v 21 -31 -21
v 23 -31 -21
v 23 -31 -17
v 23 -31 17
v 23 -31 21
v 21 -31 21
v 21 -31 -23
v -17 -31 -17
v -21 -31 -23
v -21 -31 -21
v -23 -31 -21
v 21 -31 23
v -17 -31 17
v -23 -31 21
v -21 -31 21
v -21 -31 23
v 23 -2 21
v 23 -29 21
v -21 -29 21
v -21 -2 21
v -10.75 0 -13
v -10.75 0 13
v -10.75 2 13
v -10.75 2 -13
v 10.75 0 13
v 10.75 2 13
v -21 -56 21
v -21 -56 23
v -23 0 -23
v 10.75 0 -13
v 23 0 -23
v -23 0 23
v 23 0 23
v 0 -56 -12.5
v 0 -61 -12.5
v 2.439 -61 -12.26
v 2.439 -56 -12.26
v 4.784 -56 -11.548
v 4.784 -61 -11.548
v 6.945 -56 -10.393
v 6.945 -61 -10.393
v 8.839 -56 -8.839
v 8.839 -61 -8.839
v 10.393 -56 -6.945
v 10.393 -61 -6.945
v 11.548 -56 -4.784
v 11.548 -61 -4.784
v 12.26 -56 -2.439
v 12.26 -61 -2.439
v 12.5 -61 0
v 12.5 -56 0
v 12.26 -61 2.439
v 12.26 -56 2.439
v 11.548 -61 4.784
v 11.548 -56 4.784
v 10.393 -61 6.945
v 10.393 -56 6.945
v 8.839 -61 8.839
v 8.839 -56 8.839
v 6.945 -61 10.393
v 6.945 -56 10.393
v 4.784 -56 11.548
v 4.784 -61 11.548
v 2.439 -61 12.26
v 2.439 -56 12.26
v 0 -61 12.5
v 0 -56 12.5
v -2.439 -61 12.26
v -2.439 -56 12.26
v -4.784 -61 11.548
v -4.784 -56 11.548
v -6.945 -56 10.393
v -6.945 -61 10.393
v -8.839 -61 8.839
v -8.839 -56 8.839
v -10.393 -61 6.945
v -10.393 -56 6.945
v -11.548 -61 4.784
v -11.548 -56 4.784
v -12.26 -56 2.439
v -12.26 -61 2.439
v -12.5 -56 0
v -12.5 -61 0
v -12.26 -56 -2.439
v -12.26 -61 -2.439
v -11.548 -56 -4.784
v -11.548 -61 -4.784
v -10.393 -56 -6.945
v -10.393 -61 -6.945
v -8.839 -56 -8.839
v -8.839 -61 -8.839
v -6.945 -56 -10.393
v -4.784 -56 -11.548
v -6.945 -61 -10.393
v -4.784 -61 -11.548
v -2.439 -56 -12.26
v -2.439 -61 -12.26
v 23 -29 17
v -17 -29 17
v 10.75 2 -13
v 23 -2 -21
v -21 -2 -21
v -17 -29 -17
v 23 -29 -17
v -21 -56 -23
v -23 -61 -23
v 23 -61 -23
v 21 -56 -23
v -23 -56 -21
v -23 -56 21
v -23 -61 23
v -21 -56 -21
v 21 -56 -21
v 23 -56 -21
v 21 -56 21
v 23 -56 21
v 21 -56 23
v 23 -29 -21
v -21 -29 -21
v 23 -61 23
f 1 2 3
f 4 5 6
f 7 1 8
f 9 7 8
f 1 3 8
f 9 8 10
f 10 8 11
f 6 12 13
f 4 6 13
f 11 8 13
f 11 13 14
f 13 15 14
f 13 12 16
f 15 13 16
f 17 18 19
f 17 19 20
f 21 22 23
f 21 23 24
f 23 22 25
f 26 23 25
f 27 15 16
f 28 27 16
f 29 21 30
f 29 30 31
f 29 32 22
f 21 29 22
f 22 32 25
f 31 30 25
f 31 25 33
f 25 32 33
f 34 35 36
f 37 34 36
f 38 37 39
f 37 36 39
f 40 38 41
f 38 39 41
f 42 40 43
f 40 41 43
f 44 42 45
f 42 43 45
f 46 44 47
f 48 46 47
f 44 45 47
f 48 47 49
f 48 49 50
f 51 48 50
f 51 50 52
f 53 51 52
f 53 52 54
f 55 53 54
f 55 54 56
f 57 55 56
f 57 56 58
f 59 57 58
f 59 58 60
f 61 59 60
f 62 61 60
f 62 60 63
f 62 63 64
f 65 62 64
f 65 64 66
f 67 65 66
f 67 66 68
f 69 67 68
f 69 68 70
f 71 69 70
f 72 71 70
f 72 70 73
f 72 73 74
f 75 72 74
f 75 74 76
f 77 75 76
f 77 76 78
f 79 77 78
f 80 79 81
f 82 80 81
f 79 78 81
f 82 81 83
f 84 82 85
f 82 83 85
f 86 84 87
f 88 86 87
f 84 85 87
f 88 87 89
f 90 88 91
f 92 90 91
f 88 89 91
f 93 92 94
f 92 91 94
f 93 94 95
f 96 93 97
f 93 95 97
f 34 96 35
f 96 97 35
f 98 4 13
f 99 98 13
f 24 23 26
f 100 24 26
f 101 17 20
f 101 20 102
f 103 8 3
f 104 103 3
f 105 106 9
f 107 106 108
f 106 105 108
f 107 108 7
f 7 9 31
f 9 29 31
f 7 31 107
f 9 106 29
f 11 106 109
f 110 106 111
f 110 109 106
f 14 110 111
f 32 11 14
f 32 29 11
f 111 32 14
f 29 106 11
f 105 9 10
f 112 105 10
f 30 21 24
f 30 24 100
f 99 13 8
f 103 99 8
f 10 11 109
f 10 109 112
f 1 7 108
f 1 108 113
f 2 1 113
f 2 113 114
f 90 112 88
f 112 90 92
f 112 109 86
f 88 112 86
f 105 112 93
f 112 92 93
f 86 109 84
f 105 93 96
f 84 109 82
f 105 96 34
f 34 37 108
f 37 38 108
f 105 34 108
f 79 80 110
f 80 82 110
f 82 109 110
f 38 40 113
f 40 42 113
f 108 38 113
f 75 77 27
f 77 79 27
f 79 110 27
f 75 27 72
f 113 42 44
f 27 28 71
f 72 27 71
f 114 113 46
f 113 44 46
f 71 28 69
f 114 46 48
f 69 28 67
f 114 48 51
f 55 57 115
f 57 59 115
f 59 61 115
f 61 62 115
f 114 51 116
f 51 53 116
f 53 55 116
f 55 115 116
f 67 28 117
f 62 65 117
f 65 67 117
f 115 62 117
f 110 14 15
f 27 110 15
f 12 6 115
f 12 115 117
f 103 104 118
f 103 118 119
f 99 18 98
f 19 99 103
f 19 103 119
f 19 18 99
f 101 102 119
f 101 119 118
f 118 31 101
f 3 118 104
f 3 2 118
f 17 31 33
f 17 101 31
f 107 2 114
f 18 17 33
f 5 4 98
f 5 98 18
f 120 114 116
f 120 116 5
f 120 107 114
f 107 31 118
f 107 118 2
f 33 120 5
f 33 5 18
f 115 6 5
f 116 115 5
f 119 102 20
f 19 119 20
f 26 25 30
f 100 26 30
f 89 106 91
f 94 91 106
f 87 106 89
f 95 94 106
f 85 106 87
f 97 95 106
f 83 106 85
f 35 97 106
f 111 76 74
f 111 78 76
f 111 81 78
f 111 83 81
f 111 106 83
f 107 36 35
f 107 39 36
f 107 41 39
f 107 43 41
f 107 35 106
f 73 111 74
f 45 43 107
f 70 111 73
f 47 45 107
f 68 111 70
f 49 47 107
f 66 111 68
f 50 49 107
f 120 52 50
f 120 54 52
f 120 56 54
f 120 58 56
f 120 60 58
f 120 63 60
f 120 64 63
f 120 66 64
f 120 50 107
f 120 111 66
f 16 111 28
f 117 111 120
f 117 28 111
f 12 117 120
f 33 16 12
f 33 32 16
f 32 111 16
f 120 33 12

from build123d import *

# Parameters (mm, degrees)
CROQUIS1_W              = 21.5
CROQUIS1_H              = 26
SALIENTE_EXTRUIR1_DEPTH = 2
CROQUIS2_W              = 46
CROQUIS2_H              = 46
SALIENTE_EXTRUIR2_DEPTH = 2
CROQUIS3_W              = 46
CROQUIS3_H              = 46
CROQUIS3_W_2            = 42
CROQUIS3_H_2            = 42
SALIENTE_EXTRUIR3_DEPTH = 29
CROQUIS4_W              = 42
CROQUIS4_H              = 29
CORTAR_EXTRUIR1_DEPTH   = 29
SALIENTE_EXTRUIR4_DEPTH = 2
CROQUIS6_W              = 2
CROQUIS6_H              = 2
SALIENTE_EXTRUIR5_DEPTH = 30
CROQUIS7_W              = 46
CROQUIS7_H              = 46
SALIENTE_EXTRUIR6_DEPTH = 5
CROQUIS8_R              = 12.5
CORTAR_EXTRUIR2_DEPTH   = 30


with BuildPart() as part:
    # Croquis1 → Saliente-Extruir1 (new body)
    with BuildSketch(Plane(origin=(0, 0, 0), x_dir=(1, 0, 0), z_dir=(0, 1, 0))):
        Rectangle(CROQUIS1_W, CROQUIS1_H)
    extrude(amount=SALIENTE_EXTRUIR1_DEPTH)

    # Croquis2 → Saliente-Extruir2 (add)
    with BuildSketch(Plane.XZ):
        Rectangle(CROQUIS2_W, CROQUIS2_H)
    extrude(amount=SALIENTE_EXTRUIR2_DEPTH)

    # Croquis3 → Saliente-Extruir3 (add)
    with BuildSketch(Plane.XZ.offset(2)):
        Rectangle(CROQUIS3_W, CROQUIS3_H)
        Rectangle(CROQUIS3_W_2, CROQUIS3_H_2, mode=Mode.SUBTRACT)
    extrude(amount=SALIENTE_EXTRUIR3_DEPTH)

    # Croquis4 → Cortar-Extruir1 (cut)
    with BuildSketch(Plane(origin=(23, 0, 0), x_dir=(0, 0, -1), z_dir=(1, 0, 0))):
        with Locations((0, -16.5)):
            Rectangle(CROQUIS4_W, CROQUIS4_H)
    extrude(amount=-CORTAR_EXTRUIR1_DEPTH, mode=Mode.SUBTRACT)

    # Croquis5 → Saliente-Extruir4 (add)
    with BuildSketch(Plane.XZ.offset(31)):
        Polygon((23, 17), (-17, 17), (-17, -17), (23, -17), (23, -23), (-23, -23), (-23, 23), (23, 23), align=None)
    extrude(amount=-SALIENTE_EXTRUIR4_DEPTH)

    # Croquis6 → Saliente-Extruir5 (add)
    with BuildSketch(Plane.XZ.offset(31)):
        with Locations((-22, 22)):
            Rectangle(CROQUIS6_W, CROQUIS6_H)
        with Locations((22, 22)):
            Rectangle(CROQUIS6_W, CROQUIS6_H)
        with Locations((-22, -22)):
            Rectangle(CROQUIS6_W, CROQUIS6_H)
        with Locations((22, -22)):
            Rectangle(CROQUIS6_W, CROQUIS6_H)
    extrude(amount=SALIENTE_EXTRUIR5_DEPTH)

    # Croquis7 → Saliente-Extruir6 (add)
    with BuildSketch(Plane.XZ.offset(61)):
        Rectangle(CROQUIS7_W, CROQUIS7_H)
    extrude(amount=-SALIENTE_EXTRUIR6_DEPTH)

    # Croquis8 → Cortar-Extruir2 (cut)
    with BuildSketch(Plane.XZ.offset(61)):
        with Locations(Location((0, 0, 0), (0, 0, 270))):
            Circle(CROQUIS8_R)
    extrude(amount=-CORTAR_EXTRUIR2_DEPTH, mode=Mode.SUBTRACT)


solid = part.part
